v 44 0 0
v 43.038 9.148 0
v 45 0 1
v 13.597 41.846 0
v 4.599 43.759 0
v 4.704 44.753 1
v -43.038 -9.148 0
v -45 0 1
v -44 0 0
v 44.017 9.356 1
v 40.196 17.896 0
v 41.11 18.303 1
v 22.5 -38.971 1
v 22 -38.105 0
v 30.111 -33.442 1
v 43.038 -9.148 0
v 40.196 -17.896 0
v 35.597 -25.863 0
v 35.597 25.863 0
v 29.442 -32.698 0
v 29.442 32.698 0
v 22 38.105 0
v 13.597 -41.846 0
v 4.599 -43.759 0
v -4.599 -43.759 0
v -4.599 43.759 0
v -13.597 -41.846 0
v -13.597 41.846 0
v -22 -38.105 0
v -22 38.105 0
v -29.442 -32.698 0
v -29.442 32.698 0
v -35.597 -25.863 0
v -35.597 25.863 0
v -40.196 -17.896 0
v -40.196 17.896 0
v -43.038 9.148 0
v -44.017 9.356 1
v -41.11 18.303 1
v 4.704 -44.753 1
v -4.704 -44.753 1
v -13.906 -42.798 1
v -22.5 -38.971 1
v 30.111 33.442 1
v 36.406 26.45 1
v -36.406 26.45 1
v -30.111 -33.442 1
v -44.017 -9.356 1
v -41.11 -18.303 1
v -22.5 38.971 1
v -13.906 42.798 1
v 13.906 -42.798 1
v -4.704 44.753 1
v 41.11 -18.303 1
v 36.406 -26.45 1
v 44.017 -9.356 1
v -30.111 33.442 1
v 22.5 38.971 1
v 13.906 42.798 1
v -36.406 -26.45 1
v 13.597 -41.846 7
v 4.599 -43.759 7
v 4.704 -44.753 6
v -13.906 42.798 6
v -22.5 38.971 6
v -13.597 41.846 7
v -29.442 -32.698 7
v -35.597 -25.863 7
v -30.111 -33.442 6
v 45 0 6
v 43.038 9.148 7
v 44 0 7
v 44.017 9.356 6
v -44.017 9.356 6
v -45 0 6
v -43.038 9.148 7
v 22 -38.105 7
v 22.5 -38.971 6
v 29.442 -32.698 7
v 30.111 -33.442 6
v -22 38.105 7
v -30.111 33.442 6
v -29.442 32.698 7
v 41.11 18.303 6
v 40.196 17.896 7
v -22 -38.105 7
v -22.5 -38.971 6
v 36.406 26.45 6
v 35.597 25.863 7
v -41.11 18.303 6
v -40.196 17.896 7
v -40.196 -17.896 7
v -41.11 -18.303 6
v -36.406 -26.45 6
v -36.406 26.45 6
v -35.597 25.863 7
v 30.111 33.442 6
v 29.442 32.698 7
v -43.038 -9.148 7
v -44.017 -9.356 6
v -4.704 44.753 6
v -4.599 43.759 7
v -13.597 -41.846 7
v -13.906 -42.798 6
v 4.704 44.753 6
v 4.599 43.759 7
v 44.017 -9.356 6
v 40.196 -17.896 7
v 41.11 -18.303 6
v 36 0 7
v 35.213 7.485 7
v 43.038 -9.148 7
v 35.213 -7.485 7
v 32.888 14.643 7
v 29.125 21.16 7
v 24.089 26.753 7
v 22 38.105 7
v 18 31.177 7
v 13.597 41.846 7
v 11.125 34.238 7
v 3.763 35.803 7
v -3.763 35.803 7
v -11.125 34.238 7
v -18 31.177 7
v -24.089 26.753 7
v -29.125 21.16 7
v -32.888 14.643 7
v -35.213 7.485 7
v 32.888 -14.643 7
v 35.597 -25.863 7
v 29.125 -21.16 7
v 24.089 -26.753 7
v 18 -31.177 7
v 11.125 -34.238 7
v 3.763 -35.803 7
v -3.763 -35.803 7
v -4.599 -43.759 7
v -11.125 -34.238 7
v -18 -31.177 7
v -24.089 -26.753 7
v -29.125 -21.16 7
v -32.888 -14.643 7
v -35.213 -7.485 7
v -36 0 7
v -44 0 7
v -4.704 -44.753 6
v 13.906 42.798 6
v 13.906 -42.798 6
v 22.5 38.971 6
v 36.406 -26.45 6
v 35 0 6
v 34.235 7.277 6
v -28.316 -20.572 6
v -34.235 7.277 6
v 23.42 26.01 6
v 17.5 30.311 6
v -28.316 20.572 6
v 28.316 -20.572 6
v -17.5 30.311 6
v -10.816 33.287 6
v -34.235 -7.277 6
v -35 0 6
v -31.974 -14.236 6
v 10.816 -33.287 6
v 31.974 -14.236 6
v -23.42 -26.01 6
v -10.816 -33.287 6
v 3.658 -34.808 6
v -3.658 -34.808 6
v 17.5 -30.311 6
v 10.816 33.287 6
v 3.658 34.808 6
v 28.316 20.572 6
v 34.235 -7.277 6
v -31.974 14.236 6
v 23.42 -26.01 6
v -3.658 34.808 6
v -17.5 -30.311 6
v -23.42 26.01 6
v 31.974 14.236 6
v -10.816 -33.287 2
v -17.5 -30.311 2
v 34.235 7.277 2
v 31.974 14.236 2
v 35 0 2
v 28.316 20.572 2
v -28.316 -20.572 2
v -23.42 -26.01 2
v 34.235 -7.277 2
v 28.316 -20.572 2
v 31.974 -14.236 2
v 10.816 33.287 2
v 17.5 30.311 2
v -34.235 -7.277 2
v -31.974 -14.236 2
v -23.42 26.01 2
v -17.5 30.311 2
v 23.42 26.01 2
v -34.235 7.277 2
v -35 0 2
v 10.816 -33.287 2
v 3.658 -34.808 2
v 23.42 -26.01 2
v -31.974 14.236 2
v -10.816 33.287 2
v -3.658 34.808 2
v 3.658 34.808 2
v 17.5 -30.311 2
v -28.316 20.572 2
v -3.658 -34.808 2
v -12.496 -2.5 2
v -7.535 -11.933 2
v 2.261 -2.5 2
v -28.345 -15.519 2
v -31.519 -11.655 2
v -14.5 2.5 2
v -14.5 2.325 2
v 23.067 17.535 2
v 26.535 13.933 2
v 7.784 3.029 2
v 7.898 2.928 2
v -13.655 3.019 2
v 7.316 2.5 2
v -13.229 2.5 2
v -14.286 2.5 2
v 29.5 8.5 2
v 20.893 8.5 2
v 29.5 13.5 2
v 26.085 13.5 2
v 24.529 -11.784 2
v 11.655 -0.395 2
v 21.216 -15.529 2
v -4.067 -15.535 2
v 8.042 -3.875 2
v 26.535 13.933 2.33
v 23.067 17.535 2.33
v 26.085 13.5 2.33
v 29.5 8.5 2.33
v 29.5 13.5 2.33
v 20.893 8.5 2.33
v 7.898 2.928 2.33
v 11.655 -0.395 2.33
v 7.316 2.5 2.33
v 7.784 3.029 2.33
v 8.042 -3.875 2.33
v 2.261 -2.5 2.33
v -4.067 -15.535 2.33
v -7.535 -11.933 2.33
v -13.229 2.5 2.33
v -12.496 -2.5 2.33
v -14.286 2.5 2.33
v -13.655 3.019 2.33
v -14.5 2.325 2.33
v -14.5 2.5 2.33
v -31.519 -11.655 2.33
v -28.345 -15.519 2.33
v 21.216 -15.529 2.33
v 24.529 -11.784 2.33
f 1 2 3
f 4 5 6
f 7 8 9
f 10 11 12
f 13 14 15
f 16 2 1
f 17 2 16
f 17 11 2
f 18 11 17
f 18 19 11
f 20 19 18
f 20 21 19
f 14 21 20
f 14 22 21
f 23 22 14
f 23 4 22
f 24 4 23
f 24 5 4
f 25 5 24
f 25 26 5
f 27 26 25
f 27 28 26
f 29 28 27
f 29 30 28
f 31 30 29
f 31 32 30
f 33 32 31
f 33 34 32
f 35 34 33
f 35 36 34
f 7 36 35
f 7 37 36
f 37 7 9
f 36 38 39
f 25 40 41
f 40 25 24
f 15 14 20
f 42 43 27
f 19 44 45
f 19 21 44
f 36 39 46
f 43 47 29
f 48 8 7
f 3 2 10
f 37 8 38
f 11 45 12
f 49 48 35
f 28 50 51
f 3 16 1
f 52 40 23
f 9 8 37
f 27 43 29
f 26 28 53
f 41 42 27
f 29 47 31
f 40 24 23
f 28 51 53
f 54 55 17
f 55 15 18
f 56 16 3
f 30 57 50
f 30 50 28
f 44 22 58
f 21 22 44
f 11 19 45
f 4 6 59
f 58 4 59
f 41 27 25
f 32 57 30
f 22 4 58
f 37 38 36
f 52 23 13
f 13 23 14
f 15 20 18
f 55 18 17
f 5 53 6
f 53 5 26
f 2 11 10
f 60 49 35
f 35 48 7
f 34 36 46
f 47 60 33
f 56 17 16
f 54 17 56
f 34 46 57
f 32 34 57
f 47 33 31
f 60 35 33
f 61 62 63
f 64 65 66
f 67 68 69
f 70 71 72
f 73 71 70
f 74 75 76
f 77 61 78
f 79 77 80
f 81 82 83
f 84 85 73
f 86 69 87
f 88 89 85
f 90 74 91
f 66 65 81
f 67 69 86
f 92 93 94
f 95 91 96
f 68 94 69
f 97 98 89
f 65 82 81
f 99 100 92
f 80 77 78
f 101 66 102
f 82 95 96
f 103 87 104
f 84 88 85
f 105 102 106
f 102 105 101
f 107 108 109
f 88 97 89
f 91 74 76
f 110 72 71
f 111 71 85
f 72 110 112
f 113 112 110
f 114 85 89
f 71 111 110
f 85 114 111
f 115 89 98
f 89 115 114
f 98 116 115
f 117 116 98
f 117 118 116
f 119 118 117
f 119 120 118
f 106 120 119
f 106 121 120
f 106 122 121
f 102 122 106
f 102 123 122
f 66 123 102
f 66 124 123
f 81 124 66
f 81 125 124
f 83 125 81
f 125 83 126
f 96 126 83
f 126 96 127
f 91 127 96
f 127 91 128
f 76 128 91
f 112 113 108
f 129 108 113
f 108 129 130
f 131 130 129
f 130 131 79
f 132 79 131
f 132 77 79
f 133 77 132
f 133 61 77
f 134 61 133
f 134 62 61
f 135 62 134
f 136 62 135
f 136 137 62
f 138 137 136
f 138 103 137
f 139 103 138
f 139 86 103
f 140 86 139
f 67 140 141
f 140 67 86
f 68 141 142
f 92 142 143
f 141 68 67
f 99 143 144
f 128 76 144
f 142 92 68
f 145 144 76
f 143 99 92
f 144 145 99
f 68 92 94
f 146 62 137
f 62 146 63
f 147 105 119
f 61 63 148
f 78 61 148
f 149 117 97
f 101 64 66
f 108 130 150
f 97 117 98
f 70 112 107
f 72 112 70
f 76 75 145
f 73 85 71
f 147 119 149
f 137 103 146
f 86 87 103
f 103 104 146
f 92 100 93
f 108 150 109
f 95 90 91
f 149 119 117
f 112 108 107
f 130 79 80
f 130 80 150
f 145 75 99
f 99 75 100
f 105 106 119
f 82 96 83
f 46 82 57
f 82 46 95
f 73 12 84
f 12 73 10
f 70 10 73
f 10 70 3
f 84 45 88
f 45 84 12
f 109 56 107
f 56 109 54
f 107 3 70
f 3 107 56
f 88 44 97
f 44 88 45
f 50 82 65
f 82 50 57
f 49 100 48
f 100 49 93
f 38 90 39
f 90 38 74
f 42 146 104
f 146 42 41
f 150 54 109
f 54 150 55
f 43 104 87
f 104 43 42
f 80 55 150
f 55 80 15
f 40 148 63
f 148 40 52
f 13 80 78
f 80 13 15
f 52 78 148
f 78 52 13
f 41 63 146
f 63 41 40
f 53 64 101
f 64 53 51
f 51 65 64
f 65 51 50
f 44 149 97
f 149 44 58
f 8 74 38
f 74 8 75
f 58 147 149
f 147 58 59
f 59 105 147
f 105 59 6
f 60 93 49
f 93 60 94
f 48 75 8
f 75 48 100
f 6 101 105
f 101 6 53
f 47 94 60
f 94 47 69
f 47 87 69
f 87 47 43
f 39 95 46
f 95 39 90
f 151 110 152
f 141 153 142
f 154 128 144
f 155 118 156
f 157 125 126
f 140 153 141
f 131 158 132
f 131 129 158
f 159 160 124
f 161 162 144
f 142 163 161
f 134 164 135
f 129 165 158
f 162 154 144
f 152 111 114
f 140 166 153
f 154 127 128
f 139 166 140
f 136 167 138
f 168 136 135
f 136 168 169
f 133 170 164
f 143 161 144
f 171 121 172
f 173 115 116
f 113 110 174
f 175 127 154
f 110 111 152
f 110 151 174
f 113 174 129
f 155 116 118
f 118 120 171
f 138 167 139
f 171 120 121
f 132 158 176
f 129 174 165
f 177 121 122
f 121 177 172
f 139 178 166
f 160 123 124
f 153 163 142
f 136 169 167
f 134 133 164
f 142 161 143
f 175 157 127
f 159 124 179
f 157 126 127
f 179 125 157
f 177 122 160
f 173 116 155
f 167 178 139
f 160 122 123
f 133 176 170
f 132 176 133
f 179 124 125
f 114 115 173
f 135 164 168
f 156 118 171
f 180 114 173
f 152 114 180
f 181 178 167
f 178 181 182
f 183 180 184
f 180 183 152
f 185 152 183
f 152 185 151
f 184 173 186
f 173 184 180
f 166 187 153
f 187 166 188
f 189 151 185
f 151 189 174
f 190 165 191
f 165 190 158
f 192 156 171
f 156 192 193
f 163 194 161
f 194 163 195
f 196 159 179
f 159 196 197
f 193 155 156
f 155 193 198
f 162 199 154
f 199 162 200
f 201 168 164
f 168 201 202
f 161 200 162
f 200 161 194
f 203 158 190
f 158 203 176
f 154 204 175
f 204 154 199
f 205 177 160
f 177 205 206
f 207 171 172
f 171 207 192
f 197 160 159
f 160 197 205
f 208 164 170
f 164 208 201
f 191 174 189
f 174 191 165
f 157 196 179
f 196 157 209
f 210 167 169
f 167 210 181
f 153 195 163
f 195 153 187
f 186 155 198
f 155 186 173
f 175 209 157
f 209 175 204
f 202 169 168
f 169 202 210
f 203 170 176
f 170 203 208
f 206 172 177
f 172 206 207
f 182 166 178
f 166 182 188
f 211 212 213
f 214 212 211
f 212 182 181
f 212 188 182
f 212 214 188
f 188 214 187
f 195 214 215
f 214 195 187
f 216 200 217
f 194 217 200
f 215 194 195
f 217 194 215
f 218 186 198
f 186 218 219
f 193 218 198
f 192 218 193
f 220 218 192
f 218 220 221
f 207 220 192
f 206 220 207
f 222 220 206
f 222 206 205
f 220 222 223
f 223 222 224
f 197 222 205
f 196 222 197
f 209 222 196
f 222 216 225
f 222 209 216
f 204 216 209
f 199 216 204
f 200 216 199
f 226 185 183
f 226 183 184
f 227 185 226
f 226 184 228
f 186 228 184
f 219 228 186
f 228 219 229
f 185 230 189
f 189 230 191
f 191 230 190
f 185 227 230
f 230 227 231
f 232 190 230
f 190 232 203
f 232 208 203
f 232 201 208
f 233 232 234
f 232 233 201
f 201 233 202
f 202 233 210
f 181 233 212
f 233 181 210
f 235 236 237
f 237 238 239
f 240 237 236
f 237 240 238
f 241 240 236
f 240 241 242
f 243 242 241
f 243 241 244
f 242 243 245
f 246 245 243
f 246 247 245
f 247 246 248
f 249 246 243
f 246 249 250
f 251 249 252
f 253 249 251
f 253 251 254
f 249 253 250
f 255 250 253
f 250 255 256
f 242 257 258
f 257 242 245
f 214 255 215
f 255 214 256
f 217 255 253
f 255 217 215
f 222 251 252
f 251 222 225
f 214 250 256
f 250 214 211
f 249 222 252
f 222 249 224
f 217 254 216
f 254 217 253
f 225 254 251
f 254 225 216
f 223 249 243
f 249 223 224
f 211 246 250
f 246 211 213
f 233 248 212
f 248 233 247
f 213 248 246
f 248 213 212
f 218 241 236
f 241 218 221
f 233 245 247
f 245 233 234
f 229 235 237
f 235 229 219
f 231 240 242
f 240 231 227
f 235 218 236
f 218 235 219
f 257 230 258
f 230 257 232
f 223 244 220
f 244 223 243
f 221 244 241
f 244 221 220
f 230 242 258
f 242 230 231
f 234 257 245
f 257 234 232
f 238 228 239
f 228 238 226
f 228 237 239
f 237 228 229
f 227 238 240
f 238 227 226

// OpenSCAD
//  Create a coaster that is 3D printable 
//  maybe stack
//  v2 add the logo
// January 2014 - JWR
// 


module coaster(diam, height, thick, chamfer)
{
 difference () 
{ 
// Define the cylinder with top and bottom
// outside chamfers
union()
{
// bottom outside chamfer
cylinder(h = chamfer, r1 = (diam / 2) - chamfer, r2 = (diam / 2), center = false);
// top outside chamfer
translate([0,0,height - chamfer])
cylinder(h = chamfer, r1 = (diam / 2), r2 = (outside_diam / 2) - chamfer, center = false);
// middle of cylinder
translate([0,0,chamfer])
cylinder(h = height - chamfer - chamfer, r = (diam / 2), center = false);
} // end union outside
// subtract the inside
union()
{
// inside chamfer
translate([0,0,height - chamfer])
cylinder(h = chamfer, r1 = (diam / 2) - rim, r2 = (diam / 2) - rim + chamfer, center = false);

// interior space
translate([0,0,thick])
cylinder(h = height- thick, r = (diam / 2) - rim, center = false);
} // end union inside
} // end difference outside - inside
} // end coaster module 

module limb(startx, starty, endx, endy, width, elev, z)
{
translate([startx, starty, z])
rotate( a = [0, 0, atan((endy - starty)/(endx - startx))])
translate([-width/2, -width/2, 0])
cube([pow(pow(endx - startx,2)+pow(endy - starty ,2),0.5) + width , width, elev], center=false);

} // end limb module


// define parameters
// mm units
outside_diam = 90;
height = 7;
rim = 10;
thick = 2; // thickness of base
logo_height = 0.33;
logo_width = 5;
chamfer = 1;
//



 	// draw each part
limb(-28,-12,-14,-0.5, logo_width,logo_height,thick);
limb( -12,0,9,0, logo_width, logo_height, thick);
limb( -4,-12,23,14, logo_width,logo_height,thick);
limb(8,-0.5,21,-12, logo_width,logo_height,thick);
limb(22,11,27,11, logo_width,logo_height,thick);

coaster(outside_diam, height, thick, chamfer);
